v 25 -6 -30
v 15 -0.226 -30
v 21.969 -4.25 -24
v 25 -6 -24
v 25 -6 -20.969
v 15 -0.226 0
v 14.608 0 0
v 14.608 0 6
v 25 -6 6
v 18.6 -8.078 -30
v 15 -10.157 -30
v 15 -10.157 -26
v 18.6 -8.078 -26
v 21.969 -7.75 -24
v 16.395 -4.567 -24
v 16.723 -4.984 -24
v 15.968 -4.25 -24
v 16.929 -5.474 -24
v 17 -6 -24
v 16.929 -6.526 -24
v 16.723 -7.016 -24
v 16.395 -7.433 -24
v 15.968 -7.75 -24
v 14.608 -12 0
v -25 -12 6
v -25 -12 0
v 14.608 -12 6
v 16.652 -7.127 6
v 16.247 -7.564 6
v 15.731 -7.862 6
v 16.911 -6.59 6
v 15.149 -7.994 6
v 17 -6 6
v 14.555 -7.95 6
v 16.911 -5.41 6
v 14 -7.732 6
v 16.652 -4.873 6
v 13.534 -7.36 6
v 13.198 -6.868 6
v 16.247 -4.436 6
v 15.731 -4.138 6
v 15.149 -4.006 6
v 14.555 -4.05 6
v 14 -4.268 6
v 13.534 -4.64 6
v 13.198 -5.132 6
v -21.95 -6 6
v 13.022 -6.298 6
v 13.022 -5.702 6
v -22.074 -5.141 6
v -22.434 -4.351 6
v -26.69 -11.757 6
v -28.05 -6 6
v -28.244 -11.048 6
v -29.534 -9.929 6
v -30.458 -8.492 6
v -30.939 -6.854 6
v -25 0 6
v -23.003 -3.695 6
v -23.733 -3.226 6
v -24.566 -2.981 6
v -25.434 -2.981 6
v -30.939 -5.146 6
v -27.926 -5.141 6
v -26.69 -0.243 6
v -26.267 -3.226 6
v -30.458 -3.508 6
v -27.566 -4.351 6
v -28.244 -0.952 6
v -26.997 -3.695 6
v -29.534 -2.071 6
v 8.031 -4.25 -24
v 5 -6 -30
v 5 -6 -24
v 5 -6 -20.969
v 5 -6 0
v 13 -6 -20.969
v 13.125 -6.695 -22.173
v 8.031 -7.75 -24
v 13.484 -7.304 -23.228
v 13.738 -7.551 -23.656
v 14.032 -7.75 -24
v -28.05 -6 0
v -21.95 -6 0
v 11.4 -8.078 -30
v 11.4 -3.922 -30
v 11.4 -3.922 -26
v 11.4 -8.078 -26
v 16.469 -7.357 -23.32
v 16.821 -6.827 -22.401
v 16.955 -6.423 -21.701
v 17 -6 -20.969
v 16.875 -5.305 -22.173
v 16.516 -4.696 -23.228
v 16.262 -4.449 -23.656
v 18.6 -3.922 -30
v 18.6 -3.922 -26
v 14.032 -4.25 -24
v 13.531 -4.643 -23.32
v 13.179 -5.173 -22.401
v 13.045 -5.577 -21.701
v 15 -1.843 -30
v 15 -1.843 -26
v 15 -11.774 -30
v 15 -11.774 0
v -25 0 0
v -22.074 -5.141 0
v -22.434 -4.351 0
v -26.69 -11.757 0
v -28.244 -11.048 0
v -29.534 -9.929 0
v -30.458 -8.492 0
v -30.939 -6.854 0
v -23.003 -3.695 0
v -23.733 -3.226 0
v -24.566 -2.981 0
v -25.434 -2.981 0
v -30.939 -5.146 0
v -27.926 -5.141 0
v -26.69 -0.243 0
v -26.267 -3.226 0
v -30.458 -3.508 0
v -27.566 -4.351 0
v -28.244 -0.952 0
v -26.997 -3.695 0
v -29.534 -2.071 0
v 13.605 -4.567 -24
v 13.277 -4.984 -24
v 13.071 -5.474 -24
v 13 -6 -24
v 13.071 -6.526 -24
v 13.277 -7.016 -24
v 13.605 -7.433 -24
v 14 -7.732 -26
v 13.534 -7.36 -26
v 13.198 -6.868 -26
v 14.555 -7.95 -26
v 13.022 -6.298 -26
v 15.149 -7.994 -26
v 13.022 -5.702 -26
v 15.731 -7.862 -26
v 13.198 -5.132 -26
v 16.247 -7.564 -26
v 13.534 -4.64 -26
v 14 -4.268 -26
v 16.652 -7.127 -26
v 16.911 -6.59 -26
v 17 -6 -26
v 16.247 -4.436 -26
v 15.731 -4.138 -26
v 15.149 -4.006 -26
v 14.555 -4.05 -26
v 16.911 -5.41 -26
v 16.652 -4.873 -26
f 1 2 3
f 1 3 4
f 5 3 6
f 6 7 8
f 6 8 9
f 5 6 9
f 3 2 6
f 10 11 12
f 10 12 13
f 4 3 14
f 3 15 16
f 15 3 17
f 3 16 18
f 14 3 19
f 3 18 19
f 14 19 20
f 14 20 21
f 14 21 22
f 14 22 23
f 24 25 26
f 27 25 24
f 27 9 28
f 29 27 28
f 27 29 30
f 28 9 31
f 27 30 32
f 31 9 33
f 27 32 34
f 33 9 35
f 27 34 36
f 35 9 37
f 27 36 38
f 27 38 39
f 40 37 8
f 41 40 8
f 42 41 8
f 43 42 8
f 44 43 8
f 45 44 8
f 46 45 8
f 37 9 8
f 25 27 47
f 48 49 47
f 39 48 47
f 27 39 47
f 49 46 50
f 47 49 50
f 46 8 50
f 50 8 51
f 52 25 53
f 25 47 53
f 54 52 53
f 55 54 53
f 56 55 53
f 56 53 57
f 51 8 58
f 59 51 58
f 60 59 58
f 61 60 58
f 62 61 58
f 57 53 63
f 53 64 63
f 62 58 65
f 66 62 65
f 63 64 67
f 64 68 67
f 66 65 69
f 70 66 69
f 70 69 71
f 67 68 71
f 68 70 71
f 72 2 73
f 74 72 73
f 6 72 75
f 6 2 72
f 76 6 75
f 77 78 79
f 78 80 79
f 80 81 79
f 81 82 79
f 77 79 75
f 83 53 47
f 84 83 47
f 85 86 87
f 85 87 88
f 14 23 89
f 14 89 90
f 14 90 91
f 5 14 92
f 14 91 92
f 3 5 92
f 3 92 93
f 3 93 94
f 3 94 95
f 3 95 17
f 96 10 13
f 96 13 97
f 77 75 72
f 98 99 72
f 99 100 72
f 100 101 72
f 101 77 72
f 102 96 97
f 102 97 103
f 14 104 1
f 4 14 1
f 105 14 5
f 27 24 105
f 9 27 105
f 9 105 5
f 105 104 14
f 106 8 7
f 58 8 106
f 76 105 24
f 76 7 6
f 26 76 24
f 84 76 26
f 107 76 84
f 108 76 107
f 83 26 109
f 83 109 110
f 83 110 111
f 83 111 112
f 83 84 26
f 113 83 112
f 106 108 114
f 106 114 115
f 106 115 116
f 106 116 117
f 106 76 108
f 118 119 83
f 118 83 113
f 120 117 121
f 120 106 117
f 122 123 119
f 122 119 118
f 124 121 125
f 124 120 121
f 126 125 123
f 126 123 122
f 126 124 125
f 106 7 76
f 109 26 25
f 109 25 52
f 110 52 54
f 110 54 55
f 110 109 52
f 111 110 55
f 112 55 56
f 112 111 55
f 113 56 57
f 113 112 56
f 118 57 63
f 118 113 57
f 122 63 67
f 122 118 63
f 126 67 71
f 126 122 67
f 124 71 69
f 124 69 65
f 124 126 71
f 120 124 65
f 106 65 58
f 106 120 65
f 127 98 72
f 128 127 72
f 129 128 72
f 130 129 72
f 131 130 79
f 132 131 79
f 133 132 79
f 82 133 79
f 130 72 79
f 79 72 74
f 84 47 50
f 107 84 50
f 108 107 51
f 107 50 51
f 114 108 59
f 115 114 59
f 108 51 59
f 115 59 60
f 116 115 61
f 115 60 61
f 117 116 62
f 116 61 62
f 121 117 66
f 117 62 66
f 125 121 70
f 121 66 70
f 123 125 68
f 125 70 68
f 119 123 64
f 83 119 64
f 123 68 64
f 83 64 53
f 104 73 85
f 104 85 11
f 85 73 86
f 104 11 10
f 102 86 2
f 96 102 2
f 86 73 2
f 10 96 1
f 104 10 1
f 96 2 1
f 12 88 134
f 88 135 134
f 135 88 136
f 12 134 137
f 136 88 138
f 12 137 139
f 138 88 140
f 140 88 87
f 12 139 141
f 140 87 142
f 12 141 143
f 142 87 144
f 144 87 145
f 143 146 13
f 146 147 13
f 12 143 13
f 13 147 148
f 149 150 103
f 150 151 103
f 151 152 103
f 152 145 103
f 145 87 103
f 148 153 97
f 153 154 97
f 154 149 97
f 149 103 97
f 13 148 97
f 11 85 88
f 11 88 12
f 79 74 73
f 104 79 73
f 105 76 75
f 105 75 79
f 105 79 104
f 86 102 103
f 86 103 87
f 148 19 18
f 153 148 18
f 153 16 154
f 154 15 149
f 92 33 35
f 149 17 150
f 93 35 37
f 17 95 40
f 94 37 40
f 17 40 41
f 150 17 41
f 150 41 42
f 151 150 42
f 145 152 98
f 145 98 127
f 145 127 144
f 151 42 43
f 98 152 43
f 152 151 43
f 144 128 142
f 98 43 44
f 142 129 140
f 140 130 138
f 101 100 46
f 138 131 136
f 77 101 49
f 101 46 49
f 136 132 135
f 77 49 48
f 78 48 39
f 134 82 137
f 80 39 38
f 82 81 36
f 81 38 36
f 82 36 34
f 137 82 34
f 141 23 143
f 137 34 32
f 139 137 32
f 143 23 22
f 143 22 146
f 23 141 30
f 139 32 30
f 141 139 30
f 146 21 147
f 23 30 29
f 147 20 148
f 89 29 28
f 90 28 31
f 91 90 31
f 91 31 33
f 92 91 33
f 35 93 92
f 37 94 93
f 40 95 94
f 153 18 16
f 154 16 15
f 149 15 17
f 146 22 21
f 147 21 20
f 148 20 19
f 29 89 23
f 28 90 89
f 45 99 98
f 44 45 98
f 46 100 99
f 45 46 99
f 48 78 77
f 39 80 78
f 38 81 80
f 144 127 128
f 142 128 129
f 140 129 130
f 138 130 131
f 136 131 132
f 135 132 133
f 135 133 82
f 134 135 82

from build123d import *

# Parameters (mm, degrees)
BOSS_EXTRUDE1_DEPTH = 6
CUT_EXTRUDE1_REACH  = 35.779
BOSS_EXTRUDE2_DEPTH = 30
CUT_EXTRUDE2_REACH  = 50.374
SKETCH5_R           = 2
CUT_EXTRUDE3_DEPTH  = 50
CHAMFER1_SIZE       = 10.392304845
CHAMFER1_SIZE_2     = 6
CHAMFER2_SIZE       = 10.392304845
CHAMFER2_SIZE_2     = 6
CUT_EXTRUDE4_DEPTH  = 4


with BuildPart() as part:
    # Sketch1 → Boss-Extrude1 (new body)
    with BuildSketch(Plane.XY):
        with BuildLine():
            Line((-25, 0), (0, 0))
            Line((0, 0), (25, 0))
            Line((25, 0), (25, -12))
            Line((25, -12), (-25, -12))
            ThreePointArc((-25, -12), (-31, -6), (-25, 0))
        make_face()
    extrude(amount=BOSS_EXTRUDE1_DEPTH)

    # Sketch2 → Cut-Extrude1 (cut, up to next)
    with BuildSketch(Plane.XY.offset(6), mode=Mode.PRIVATE) as cut_extrude1_sk1:
        with BuildLine():
            Line((-28.05, -6), (-21.95, -6))
            ThreePointArc((-21.95, -6), (-25, -2.95), (-28.05, -6))
        make_face()
    cut_extrude1_tool1 = extrude(cut_extrude1_sk1.sketch, amount=-CUT_EXTRUDE1_REACH, mode=Mode.PRIVATE) & part.part
    add(cut_extrude1_tool1.solids().sort_by_distance((-25, -4.70554, 6))[0], mode=Mode.SUBTRACT)

    # Sketch3 → Boss-Extrude2 (add)
    with BuildSketch(Plane(origin=(0, 0, 0), x_dir=(-1, 0, 0), z_dir=(0, 0, -1))):
        Polygon((-25, 0), (-5, 0), (-5, -6), (-5, -12), (-25, -12), align=None)
    extrude(amount=BOSS_EXTRUDE2_DEPTH)

    # Sketch4 → Cut-Extrude2 (cut, up to next)
    with BuildSketch(Plane.ZY.offset(-5), mode=Mode.PRIVATE) as cut_extrude2_sk1:
        Polygon((-20.968911087, -6), (-24, -4.25), (-24, -7.75), align=None)
    cut_extrude2_tool1 = extrude(cut_extrude2_sk1.sketch, amount=-CUT_EXTRUDE2_REACH, mode=Mode.PRIVATE) & part.part
    add(cut_extrude2_tool1.solids().sort_by_distance((5, -6, -22.989637))[0], mode=Mode.SUBTRACT)

    # Sketch5 → Cut-Extrude3 (cut, through all)
    with BuildSketch(Plane.XY.offset(6)):
        with Locations((15, -6)):
            Circle(SKETCH5_R)
    extrude(amount=-CUT_EXTRUDE3_DEPTH, mode=Mode.SUBTRACT)

    # Chamfer1
    # the kernel refuses this chamfer: 10.392304845, 6 mm, written as the material it takes off along each edge
    with BuildSketch(Plane(origin=(5, 0, 0), x_dir=(0.9998132206222079, 0.019326765612700622, 0), z_dir=(0, 0, -1))) as chamfer1_piece_1:
        Polygon((CHAMFER1_SIZE * 0.999813220662, CHAMFER1_SIZE * 0.0193267656135), (-CHAMFER1_SIZE_2 * 0.0193267656127, CHAMFER1_SIZE_2 * 0.999813220622), (0, 0), align=None)
    extrude(amount=56.885783824, mode=Mode.SUBTRACT)
    with BuildSketch(Plane(origin=(5, -12, 0), x_dir=(-0.057893862402671484, 0.9983227437537926, 0), z_dir=(0, 0, -1))) as chamfer1_piece_2:
        Polygon((CHAMFER1_SIZE_2 * 0.998322743754, CHAMFER1_SIZE_2 * 0.0578938624027), (-CHAMFER1_SIZE * 0.057893862405, CHAMFER1_SIZE * 0.998322743793), (0, 0), align=None)
    extrude(amount=56.885783824, mode=Mode.SUBTRACT)

    # Chamfer2
    # the kernel refuses this chamfer: 10.392304845, 6 mm, written as the material it takes off along each edge
    with BuildSketch(Plane(origin=(25, -12, 32.885783824), x_dir=(-0.9998132206222079, -0.01932676561270069, 0), z_dir=(0, 0, -1))) as chamfer2_piece_1:
        Polygon((CHAMFER2_SIZE * 0.999813220662, CHAMFER2_SIZE * 0.0193267656135), (-CHAMFER2_SIZE_2 * 0.0193267656127, CHAMFER2_SIZE_2 * 0.999813220622), (0, 0), align=None)
    extrude(amount=89.771567647, mode=Mode.SUBTRACT)
    with BuildSketch(Plane(origin=(25, 0, 32.885783824), x_dir=(-0.9998132206222079, 0.019326765612700622, 0), z_dir=(0, 0, -1))) as chamfer2_piece_2:
        Polygon((CHAMFER2_SIZE * 0.999813220662, -CHAMFER2_SIZE * 0.0193267656135), (-CHAMFER2_SIZE_2 * 0.0193267656127, -CHAMFER2_SIZE_2 * 0.999813220622), (0, 0), align=None)
    extrude(amount=89.771567647, mode=Mode.SUBTRACT)

    # Sketch6 → Cut-Extrude4 (cut)
    with BuildSketch(Plane.XY.offset(-30)):
        Polygon((11.4, -3.921539031), (11.4, -8.078460969), (15, -10.156921938), (18.6, -8.078460969), (18.6, -3.921539031), (15, -1.843078062), align=None)
    extrude(amount=CUT_EXTRUDE4_DEPTH, mode=Mode.SUBTRACT)


solid = part.part
